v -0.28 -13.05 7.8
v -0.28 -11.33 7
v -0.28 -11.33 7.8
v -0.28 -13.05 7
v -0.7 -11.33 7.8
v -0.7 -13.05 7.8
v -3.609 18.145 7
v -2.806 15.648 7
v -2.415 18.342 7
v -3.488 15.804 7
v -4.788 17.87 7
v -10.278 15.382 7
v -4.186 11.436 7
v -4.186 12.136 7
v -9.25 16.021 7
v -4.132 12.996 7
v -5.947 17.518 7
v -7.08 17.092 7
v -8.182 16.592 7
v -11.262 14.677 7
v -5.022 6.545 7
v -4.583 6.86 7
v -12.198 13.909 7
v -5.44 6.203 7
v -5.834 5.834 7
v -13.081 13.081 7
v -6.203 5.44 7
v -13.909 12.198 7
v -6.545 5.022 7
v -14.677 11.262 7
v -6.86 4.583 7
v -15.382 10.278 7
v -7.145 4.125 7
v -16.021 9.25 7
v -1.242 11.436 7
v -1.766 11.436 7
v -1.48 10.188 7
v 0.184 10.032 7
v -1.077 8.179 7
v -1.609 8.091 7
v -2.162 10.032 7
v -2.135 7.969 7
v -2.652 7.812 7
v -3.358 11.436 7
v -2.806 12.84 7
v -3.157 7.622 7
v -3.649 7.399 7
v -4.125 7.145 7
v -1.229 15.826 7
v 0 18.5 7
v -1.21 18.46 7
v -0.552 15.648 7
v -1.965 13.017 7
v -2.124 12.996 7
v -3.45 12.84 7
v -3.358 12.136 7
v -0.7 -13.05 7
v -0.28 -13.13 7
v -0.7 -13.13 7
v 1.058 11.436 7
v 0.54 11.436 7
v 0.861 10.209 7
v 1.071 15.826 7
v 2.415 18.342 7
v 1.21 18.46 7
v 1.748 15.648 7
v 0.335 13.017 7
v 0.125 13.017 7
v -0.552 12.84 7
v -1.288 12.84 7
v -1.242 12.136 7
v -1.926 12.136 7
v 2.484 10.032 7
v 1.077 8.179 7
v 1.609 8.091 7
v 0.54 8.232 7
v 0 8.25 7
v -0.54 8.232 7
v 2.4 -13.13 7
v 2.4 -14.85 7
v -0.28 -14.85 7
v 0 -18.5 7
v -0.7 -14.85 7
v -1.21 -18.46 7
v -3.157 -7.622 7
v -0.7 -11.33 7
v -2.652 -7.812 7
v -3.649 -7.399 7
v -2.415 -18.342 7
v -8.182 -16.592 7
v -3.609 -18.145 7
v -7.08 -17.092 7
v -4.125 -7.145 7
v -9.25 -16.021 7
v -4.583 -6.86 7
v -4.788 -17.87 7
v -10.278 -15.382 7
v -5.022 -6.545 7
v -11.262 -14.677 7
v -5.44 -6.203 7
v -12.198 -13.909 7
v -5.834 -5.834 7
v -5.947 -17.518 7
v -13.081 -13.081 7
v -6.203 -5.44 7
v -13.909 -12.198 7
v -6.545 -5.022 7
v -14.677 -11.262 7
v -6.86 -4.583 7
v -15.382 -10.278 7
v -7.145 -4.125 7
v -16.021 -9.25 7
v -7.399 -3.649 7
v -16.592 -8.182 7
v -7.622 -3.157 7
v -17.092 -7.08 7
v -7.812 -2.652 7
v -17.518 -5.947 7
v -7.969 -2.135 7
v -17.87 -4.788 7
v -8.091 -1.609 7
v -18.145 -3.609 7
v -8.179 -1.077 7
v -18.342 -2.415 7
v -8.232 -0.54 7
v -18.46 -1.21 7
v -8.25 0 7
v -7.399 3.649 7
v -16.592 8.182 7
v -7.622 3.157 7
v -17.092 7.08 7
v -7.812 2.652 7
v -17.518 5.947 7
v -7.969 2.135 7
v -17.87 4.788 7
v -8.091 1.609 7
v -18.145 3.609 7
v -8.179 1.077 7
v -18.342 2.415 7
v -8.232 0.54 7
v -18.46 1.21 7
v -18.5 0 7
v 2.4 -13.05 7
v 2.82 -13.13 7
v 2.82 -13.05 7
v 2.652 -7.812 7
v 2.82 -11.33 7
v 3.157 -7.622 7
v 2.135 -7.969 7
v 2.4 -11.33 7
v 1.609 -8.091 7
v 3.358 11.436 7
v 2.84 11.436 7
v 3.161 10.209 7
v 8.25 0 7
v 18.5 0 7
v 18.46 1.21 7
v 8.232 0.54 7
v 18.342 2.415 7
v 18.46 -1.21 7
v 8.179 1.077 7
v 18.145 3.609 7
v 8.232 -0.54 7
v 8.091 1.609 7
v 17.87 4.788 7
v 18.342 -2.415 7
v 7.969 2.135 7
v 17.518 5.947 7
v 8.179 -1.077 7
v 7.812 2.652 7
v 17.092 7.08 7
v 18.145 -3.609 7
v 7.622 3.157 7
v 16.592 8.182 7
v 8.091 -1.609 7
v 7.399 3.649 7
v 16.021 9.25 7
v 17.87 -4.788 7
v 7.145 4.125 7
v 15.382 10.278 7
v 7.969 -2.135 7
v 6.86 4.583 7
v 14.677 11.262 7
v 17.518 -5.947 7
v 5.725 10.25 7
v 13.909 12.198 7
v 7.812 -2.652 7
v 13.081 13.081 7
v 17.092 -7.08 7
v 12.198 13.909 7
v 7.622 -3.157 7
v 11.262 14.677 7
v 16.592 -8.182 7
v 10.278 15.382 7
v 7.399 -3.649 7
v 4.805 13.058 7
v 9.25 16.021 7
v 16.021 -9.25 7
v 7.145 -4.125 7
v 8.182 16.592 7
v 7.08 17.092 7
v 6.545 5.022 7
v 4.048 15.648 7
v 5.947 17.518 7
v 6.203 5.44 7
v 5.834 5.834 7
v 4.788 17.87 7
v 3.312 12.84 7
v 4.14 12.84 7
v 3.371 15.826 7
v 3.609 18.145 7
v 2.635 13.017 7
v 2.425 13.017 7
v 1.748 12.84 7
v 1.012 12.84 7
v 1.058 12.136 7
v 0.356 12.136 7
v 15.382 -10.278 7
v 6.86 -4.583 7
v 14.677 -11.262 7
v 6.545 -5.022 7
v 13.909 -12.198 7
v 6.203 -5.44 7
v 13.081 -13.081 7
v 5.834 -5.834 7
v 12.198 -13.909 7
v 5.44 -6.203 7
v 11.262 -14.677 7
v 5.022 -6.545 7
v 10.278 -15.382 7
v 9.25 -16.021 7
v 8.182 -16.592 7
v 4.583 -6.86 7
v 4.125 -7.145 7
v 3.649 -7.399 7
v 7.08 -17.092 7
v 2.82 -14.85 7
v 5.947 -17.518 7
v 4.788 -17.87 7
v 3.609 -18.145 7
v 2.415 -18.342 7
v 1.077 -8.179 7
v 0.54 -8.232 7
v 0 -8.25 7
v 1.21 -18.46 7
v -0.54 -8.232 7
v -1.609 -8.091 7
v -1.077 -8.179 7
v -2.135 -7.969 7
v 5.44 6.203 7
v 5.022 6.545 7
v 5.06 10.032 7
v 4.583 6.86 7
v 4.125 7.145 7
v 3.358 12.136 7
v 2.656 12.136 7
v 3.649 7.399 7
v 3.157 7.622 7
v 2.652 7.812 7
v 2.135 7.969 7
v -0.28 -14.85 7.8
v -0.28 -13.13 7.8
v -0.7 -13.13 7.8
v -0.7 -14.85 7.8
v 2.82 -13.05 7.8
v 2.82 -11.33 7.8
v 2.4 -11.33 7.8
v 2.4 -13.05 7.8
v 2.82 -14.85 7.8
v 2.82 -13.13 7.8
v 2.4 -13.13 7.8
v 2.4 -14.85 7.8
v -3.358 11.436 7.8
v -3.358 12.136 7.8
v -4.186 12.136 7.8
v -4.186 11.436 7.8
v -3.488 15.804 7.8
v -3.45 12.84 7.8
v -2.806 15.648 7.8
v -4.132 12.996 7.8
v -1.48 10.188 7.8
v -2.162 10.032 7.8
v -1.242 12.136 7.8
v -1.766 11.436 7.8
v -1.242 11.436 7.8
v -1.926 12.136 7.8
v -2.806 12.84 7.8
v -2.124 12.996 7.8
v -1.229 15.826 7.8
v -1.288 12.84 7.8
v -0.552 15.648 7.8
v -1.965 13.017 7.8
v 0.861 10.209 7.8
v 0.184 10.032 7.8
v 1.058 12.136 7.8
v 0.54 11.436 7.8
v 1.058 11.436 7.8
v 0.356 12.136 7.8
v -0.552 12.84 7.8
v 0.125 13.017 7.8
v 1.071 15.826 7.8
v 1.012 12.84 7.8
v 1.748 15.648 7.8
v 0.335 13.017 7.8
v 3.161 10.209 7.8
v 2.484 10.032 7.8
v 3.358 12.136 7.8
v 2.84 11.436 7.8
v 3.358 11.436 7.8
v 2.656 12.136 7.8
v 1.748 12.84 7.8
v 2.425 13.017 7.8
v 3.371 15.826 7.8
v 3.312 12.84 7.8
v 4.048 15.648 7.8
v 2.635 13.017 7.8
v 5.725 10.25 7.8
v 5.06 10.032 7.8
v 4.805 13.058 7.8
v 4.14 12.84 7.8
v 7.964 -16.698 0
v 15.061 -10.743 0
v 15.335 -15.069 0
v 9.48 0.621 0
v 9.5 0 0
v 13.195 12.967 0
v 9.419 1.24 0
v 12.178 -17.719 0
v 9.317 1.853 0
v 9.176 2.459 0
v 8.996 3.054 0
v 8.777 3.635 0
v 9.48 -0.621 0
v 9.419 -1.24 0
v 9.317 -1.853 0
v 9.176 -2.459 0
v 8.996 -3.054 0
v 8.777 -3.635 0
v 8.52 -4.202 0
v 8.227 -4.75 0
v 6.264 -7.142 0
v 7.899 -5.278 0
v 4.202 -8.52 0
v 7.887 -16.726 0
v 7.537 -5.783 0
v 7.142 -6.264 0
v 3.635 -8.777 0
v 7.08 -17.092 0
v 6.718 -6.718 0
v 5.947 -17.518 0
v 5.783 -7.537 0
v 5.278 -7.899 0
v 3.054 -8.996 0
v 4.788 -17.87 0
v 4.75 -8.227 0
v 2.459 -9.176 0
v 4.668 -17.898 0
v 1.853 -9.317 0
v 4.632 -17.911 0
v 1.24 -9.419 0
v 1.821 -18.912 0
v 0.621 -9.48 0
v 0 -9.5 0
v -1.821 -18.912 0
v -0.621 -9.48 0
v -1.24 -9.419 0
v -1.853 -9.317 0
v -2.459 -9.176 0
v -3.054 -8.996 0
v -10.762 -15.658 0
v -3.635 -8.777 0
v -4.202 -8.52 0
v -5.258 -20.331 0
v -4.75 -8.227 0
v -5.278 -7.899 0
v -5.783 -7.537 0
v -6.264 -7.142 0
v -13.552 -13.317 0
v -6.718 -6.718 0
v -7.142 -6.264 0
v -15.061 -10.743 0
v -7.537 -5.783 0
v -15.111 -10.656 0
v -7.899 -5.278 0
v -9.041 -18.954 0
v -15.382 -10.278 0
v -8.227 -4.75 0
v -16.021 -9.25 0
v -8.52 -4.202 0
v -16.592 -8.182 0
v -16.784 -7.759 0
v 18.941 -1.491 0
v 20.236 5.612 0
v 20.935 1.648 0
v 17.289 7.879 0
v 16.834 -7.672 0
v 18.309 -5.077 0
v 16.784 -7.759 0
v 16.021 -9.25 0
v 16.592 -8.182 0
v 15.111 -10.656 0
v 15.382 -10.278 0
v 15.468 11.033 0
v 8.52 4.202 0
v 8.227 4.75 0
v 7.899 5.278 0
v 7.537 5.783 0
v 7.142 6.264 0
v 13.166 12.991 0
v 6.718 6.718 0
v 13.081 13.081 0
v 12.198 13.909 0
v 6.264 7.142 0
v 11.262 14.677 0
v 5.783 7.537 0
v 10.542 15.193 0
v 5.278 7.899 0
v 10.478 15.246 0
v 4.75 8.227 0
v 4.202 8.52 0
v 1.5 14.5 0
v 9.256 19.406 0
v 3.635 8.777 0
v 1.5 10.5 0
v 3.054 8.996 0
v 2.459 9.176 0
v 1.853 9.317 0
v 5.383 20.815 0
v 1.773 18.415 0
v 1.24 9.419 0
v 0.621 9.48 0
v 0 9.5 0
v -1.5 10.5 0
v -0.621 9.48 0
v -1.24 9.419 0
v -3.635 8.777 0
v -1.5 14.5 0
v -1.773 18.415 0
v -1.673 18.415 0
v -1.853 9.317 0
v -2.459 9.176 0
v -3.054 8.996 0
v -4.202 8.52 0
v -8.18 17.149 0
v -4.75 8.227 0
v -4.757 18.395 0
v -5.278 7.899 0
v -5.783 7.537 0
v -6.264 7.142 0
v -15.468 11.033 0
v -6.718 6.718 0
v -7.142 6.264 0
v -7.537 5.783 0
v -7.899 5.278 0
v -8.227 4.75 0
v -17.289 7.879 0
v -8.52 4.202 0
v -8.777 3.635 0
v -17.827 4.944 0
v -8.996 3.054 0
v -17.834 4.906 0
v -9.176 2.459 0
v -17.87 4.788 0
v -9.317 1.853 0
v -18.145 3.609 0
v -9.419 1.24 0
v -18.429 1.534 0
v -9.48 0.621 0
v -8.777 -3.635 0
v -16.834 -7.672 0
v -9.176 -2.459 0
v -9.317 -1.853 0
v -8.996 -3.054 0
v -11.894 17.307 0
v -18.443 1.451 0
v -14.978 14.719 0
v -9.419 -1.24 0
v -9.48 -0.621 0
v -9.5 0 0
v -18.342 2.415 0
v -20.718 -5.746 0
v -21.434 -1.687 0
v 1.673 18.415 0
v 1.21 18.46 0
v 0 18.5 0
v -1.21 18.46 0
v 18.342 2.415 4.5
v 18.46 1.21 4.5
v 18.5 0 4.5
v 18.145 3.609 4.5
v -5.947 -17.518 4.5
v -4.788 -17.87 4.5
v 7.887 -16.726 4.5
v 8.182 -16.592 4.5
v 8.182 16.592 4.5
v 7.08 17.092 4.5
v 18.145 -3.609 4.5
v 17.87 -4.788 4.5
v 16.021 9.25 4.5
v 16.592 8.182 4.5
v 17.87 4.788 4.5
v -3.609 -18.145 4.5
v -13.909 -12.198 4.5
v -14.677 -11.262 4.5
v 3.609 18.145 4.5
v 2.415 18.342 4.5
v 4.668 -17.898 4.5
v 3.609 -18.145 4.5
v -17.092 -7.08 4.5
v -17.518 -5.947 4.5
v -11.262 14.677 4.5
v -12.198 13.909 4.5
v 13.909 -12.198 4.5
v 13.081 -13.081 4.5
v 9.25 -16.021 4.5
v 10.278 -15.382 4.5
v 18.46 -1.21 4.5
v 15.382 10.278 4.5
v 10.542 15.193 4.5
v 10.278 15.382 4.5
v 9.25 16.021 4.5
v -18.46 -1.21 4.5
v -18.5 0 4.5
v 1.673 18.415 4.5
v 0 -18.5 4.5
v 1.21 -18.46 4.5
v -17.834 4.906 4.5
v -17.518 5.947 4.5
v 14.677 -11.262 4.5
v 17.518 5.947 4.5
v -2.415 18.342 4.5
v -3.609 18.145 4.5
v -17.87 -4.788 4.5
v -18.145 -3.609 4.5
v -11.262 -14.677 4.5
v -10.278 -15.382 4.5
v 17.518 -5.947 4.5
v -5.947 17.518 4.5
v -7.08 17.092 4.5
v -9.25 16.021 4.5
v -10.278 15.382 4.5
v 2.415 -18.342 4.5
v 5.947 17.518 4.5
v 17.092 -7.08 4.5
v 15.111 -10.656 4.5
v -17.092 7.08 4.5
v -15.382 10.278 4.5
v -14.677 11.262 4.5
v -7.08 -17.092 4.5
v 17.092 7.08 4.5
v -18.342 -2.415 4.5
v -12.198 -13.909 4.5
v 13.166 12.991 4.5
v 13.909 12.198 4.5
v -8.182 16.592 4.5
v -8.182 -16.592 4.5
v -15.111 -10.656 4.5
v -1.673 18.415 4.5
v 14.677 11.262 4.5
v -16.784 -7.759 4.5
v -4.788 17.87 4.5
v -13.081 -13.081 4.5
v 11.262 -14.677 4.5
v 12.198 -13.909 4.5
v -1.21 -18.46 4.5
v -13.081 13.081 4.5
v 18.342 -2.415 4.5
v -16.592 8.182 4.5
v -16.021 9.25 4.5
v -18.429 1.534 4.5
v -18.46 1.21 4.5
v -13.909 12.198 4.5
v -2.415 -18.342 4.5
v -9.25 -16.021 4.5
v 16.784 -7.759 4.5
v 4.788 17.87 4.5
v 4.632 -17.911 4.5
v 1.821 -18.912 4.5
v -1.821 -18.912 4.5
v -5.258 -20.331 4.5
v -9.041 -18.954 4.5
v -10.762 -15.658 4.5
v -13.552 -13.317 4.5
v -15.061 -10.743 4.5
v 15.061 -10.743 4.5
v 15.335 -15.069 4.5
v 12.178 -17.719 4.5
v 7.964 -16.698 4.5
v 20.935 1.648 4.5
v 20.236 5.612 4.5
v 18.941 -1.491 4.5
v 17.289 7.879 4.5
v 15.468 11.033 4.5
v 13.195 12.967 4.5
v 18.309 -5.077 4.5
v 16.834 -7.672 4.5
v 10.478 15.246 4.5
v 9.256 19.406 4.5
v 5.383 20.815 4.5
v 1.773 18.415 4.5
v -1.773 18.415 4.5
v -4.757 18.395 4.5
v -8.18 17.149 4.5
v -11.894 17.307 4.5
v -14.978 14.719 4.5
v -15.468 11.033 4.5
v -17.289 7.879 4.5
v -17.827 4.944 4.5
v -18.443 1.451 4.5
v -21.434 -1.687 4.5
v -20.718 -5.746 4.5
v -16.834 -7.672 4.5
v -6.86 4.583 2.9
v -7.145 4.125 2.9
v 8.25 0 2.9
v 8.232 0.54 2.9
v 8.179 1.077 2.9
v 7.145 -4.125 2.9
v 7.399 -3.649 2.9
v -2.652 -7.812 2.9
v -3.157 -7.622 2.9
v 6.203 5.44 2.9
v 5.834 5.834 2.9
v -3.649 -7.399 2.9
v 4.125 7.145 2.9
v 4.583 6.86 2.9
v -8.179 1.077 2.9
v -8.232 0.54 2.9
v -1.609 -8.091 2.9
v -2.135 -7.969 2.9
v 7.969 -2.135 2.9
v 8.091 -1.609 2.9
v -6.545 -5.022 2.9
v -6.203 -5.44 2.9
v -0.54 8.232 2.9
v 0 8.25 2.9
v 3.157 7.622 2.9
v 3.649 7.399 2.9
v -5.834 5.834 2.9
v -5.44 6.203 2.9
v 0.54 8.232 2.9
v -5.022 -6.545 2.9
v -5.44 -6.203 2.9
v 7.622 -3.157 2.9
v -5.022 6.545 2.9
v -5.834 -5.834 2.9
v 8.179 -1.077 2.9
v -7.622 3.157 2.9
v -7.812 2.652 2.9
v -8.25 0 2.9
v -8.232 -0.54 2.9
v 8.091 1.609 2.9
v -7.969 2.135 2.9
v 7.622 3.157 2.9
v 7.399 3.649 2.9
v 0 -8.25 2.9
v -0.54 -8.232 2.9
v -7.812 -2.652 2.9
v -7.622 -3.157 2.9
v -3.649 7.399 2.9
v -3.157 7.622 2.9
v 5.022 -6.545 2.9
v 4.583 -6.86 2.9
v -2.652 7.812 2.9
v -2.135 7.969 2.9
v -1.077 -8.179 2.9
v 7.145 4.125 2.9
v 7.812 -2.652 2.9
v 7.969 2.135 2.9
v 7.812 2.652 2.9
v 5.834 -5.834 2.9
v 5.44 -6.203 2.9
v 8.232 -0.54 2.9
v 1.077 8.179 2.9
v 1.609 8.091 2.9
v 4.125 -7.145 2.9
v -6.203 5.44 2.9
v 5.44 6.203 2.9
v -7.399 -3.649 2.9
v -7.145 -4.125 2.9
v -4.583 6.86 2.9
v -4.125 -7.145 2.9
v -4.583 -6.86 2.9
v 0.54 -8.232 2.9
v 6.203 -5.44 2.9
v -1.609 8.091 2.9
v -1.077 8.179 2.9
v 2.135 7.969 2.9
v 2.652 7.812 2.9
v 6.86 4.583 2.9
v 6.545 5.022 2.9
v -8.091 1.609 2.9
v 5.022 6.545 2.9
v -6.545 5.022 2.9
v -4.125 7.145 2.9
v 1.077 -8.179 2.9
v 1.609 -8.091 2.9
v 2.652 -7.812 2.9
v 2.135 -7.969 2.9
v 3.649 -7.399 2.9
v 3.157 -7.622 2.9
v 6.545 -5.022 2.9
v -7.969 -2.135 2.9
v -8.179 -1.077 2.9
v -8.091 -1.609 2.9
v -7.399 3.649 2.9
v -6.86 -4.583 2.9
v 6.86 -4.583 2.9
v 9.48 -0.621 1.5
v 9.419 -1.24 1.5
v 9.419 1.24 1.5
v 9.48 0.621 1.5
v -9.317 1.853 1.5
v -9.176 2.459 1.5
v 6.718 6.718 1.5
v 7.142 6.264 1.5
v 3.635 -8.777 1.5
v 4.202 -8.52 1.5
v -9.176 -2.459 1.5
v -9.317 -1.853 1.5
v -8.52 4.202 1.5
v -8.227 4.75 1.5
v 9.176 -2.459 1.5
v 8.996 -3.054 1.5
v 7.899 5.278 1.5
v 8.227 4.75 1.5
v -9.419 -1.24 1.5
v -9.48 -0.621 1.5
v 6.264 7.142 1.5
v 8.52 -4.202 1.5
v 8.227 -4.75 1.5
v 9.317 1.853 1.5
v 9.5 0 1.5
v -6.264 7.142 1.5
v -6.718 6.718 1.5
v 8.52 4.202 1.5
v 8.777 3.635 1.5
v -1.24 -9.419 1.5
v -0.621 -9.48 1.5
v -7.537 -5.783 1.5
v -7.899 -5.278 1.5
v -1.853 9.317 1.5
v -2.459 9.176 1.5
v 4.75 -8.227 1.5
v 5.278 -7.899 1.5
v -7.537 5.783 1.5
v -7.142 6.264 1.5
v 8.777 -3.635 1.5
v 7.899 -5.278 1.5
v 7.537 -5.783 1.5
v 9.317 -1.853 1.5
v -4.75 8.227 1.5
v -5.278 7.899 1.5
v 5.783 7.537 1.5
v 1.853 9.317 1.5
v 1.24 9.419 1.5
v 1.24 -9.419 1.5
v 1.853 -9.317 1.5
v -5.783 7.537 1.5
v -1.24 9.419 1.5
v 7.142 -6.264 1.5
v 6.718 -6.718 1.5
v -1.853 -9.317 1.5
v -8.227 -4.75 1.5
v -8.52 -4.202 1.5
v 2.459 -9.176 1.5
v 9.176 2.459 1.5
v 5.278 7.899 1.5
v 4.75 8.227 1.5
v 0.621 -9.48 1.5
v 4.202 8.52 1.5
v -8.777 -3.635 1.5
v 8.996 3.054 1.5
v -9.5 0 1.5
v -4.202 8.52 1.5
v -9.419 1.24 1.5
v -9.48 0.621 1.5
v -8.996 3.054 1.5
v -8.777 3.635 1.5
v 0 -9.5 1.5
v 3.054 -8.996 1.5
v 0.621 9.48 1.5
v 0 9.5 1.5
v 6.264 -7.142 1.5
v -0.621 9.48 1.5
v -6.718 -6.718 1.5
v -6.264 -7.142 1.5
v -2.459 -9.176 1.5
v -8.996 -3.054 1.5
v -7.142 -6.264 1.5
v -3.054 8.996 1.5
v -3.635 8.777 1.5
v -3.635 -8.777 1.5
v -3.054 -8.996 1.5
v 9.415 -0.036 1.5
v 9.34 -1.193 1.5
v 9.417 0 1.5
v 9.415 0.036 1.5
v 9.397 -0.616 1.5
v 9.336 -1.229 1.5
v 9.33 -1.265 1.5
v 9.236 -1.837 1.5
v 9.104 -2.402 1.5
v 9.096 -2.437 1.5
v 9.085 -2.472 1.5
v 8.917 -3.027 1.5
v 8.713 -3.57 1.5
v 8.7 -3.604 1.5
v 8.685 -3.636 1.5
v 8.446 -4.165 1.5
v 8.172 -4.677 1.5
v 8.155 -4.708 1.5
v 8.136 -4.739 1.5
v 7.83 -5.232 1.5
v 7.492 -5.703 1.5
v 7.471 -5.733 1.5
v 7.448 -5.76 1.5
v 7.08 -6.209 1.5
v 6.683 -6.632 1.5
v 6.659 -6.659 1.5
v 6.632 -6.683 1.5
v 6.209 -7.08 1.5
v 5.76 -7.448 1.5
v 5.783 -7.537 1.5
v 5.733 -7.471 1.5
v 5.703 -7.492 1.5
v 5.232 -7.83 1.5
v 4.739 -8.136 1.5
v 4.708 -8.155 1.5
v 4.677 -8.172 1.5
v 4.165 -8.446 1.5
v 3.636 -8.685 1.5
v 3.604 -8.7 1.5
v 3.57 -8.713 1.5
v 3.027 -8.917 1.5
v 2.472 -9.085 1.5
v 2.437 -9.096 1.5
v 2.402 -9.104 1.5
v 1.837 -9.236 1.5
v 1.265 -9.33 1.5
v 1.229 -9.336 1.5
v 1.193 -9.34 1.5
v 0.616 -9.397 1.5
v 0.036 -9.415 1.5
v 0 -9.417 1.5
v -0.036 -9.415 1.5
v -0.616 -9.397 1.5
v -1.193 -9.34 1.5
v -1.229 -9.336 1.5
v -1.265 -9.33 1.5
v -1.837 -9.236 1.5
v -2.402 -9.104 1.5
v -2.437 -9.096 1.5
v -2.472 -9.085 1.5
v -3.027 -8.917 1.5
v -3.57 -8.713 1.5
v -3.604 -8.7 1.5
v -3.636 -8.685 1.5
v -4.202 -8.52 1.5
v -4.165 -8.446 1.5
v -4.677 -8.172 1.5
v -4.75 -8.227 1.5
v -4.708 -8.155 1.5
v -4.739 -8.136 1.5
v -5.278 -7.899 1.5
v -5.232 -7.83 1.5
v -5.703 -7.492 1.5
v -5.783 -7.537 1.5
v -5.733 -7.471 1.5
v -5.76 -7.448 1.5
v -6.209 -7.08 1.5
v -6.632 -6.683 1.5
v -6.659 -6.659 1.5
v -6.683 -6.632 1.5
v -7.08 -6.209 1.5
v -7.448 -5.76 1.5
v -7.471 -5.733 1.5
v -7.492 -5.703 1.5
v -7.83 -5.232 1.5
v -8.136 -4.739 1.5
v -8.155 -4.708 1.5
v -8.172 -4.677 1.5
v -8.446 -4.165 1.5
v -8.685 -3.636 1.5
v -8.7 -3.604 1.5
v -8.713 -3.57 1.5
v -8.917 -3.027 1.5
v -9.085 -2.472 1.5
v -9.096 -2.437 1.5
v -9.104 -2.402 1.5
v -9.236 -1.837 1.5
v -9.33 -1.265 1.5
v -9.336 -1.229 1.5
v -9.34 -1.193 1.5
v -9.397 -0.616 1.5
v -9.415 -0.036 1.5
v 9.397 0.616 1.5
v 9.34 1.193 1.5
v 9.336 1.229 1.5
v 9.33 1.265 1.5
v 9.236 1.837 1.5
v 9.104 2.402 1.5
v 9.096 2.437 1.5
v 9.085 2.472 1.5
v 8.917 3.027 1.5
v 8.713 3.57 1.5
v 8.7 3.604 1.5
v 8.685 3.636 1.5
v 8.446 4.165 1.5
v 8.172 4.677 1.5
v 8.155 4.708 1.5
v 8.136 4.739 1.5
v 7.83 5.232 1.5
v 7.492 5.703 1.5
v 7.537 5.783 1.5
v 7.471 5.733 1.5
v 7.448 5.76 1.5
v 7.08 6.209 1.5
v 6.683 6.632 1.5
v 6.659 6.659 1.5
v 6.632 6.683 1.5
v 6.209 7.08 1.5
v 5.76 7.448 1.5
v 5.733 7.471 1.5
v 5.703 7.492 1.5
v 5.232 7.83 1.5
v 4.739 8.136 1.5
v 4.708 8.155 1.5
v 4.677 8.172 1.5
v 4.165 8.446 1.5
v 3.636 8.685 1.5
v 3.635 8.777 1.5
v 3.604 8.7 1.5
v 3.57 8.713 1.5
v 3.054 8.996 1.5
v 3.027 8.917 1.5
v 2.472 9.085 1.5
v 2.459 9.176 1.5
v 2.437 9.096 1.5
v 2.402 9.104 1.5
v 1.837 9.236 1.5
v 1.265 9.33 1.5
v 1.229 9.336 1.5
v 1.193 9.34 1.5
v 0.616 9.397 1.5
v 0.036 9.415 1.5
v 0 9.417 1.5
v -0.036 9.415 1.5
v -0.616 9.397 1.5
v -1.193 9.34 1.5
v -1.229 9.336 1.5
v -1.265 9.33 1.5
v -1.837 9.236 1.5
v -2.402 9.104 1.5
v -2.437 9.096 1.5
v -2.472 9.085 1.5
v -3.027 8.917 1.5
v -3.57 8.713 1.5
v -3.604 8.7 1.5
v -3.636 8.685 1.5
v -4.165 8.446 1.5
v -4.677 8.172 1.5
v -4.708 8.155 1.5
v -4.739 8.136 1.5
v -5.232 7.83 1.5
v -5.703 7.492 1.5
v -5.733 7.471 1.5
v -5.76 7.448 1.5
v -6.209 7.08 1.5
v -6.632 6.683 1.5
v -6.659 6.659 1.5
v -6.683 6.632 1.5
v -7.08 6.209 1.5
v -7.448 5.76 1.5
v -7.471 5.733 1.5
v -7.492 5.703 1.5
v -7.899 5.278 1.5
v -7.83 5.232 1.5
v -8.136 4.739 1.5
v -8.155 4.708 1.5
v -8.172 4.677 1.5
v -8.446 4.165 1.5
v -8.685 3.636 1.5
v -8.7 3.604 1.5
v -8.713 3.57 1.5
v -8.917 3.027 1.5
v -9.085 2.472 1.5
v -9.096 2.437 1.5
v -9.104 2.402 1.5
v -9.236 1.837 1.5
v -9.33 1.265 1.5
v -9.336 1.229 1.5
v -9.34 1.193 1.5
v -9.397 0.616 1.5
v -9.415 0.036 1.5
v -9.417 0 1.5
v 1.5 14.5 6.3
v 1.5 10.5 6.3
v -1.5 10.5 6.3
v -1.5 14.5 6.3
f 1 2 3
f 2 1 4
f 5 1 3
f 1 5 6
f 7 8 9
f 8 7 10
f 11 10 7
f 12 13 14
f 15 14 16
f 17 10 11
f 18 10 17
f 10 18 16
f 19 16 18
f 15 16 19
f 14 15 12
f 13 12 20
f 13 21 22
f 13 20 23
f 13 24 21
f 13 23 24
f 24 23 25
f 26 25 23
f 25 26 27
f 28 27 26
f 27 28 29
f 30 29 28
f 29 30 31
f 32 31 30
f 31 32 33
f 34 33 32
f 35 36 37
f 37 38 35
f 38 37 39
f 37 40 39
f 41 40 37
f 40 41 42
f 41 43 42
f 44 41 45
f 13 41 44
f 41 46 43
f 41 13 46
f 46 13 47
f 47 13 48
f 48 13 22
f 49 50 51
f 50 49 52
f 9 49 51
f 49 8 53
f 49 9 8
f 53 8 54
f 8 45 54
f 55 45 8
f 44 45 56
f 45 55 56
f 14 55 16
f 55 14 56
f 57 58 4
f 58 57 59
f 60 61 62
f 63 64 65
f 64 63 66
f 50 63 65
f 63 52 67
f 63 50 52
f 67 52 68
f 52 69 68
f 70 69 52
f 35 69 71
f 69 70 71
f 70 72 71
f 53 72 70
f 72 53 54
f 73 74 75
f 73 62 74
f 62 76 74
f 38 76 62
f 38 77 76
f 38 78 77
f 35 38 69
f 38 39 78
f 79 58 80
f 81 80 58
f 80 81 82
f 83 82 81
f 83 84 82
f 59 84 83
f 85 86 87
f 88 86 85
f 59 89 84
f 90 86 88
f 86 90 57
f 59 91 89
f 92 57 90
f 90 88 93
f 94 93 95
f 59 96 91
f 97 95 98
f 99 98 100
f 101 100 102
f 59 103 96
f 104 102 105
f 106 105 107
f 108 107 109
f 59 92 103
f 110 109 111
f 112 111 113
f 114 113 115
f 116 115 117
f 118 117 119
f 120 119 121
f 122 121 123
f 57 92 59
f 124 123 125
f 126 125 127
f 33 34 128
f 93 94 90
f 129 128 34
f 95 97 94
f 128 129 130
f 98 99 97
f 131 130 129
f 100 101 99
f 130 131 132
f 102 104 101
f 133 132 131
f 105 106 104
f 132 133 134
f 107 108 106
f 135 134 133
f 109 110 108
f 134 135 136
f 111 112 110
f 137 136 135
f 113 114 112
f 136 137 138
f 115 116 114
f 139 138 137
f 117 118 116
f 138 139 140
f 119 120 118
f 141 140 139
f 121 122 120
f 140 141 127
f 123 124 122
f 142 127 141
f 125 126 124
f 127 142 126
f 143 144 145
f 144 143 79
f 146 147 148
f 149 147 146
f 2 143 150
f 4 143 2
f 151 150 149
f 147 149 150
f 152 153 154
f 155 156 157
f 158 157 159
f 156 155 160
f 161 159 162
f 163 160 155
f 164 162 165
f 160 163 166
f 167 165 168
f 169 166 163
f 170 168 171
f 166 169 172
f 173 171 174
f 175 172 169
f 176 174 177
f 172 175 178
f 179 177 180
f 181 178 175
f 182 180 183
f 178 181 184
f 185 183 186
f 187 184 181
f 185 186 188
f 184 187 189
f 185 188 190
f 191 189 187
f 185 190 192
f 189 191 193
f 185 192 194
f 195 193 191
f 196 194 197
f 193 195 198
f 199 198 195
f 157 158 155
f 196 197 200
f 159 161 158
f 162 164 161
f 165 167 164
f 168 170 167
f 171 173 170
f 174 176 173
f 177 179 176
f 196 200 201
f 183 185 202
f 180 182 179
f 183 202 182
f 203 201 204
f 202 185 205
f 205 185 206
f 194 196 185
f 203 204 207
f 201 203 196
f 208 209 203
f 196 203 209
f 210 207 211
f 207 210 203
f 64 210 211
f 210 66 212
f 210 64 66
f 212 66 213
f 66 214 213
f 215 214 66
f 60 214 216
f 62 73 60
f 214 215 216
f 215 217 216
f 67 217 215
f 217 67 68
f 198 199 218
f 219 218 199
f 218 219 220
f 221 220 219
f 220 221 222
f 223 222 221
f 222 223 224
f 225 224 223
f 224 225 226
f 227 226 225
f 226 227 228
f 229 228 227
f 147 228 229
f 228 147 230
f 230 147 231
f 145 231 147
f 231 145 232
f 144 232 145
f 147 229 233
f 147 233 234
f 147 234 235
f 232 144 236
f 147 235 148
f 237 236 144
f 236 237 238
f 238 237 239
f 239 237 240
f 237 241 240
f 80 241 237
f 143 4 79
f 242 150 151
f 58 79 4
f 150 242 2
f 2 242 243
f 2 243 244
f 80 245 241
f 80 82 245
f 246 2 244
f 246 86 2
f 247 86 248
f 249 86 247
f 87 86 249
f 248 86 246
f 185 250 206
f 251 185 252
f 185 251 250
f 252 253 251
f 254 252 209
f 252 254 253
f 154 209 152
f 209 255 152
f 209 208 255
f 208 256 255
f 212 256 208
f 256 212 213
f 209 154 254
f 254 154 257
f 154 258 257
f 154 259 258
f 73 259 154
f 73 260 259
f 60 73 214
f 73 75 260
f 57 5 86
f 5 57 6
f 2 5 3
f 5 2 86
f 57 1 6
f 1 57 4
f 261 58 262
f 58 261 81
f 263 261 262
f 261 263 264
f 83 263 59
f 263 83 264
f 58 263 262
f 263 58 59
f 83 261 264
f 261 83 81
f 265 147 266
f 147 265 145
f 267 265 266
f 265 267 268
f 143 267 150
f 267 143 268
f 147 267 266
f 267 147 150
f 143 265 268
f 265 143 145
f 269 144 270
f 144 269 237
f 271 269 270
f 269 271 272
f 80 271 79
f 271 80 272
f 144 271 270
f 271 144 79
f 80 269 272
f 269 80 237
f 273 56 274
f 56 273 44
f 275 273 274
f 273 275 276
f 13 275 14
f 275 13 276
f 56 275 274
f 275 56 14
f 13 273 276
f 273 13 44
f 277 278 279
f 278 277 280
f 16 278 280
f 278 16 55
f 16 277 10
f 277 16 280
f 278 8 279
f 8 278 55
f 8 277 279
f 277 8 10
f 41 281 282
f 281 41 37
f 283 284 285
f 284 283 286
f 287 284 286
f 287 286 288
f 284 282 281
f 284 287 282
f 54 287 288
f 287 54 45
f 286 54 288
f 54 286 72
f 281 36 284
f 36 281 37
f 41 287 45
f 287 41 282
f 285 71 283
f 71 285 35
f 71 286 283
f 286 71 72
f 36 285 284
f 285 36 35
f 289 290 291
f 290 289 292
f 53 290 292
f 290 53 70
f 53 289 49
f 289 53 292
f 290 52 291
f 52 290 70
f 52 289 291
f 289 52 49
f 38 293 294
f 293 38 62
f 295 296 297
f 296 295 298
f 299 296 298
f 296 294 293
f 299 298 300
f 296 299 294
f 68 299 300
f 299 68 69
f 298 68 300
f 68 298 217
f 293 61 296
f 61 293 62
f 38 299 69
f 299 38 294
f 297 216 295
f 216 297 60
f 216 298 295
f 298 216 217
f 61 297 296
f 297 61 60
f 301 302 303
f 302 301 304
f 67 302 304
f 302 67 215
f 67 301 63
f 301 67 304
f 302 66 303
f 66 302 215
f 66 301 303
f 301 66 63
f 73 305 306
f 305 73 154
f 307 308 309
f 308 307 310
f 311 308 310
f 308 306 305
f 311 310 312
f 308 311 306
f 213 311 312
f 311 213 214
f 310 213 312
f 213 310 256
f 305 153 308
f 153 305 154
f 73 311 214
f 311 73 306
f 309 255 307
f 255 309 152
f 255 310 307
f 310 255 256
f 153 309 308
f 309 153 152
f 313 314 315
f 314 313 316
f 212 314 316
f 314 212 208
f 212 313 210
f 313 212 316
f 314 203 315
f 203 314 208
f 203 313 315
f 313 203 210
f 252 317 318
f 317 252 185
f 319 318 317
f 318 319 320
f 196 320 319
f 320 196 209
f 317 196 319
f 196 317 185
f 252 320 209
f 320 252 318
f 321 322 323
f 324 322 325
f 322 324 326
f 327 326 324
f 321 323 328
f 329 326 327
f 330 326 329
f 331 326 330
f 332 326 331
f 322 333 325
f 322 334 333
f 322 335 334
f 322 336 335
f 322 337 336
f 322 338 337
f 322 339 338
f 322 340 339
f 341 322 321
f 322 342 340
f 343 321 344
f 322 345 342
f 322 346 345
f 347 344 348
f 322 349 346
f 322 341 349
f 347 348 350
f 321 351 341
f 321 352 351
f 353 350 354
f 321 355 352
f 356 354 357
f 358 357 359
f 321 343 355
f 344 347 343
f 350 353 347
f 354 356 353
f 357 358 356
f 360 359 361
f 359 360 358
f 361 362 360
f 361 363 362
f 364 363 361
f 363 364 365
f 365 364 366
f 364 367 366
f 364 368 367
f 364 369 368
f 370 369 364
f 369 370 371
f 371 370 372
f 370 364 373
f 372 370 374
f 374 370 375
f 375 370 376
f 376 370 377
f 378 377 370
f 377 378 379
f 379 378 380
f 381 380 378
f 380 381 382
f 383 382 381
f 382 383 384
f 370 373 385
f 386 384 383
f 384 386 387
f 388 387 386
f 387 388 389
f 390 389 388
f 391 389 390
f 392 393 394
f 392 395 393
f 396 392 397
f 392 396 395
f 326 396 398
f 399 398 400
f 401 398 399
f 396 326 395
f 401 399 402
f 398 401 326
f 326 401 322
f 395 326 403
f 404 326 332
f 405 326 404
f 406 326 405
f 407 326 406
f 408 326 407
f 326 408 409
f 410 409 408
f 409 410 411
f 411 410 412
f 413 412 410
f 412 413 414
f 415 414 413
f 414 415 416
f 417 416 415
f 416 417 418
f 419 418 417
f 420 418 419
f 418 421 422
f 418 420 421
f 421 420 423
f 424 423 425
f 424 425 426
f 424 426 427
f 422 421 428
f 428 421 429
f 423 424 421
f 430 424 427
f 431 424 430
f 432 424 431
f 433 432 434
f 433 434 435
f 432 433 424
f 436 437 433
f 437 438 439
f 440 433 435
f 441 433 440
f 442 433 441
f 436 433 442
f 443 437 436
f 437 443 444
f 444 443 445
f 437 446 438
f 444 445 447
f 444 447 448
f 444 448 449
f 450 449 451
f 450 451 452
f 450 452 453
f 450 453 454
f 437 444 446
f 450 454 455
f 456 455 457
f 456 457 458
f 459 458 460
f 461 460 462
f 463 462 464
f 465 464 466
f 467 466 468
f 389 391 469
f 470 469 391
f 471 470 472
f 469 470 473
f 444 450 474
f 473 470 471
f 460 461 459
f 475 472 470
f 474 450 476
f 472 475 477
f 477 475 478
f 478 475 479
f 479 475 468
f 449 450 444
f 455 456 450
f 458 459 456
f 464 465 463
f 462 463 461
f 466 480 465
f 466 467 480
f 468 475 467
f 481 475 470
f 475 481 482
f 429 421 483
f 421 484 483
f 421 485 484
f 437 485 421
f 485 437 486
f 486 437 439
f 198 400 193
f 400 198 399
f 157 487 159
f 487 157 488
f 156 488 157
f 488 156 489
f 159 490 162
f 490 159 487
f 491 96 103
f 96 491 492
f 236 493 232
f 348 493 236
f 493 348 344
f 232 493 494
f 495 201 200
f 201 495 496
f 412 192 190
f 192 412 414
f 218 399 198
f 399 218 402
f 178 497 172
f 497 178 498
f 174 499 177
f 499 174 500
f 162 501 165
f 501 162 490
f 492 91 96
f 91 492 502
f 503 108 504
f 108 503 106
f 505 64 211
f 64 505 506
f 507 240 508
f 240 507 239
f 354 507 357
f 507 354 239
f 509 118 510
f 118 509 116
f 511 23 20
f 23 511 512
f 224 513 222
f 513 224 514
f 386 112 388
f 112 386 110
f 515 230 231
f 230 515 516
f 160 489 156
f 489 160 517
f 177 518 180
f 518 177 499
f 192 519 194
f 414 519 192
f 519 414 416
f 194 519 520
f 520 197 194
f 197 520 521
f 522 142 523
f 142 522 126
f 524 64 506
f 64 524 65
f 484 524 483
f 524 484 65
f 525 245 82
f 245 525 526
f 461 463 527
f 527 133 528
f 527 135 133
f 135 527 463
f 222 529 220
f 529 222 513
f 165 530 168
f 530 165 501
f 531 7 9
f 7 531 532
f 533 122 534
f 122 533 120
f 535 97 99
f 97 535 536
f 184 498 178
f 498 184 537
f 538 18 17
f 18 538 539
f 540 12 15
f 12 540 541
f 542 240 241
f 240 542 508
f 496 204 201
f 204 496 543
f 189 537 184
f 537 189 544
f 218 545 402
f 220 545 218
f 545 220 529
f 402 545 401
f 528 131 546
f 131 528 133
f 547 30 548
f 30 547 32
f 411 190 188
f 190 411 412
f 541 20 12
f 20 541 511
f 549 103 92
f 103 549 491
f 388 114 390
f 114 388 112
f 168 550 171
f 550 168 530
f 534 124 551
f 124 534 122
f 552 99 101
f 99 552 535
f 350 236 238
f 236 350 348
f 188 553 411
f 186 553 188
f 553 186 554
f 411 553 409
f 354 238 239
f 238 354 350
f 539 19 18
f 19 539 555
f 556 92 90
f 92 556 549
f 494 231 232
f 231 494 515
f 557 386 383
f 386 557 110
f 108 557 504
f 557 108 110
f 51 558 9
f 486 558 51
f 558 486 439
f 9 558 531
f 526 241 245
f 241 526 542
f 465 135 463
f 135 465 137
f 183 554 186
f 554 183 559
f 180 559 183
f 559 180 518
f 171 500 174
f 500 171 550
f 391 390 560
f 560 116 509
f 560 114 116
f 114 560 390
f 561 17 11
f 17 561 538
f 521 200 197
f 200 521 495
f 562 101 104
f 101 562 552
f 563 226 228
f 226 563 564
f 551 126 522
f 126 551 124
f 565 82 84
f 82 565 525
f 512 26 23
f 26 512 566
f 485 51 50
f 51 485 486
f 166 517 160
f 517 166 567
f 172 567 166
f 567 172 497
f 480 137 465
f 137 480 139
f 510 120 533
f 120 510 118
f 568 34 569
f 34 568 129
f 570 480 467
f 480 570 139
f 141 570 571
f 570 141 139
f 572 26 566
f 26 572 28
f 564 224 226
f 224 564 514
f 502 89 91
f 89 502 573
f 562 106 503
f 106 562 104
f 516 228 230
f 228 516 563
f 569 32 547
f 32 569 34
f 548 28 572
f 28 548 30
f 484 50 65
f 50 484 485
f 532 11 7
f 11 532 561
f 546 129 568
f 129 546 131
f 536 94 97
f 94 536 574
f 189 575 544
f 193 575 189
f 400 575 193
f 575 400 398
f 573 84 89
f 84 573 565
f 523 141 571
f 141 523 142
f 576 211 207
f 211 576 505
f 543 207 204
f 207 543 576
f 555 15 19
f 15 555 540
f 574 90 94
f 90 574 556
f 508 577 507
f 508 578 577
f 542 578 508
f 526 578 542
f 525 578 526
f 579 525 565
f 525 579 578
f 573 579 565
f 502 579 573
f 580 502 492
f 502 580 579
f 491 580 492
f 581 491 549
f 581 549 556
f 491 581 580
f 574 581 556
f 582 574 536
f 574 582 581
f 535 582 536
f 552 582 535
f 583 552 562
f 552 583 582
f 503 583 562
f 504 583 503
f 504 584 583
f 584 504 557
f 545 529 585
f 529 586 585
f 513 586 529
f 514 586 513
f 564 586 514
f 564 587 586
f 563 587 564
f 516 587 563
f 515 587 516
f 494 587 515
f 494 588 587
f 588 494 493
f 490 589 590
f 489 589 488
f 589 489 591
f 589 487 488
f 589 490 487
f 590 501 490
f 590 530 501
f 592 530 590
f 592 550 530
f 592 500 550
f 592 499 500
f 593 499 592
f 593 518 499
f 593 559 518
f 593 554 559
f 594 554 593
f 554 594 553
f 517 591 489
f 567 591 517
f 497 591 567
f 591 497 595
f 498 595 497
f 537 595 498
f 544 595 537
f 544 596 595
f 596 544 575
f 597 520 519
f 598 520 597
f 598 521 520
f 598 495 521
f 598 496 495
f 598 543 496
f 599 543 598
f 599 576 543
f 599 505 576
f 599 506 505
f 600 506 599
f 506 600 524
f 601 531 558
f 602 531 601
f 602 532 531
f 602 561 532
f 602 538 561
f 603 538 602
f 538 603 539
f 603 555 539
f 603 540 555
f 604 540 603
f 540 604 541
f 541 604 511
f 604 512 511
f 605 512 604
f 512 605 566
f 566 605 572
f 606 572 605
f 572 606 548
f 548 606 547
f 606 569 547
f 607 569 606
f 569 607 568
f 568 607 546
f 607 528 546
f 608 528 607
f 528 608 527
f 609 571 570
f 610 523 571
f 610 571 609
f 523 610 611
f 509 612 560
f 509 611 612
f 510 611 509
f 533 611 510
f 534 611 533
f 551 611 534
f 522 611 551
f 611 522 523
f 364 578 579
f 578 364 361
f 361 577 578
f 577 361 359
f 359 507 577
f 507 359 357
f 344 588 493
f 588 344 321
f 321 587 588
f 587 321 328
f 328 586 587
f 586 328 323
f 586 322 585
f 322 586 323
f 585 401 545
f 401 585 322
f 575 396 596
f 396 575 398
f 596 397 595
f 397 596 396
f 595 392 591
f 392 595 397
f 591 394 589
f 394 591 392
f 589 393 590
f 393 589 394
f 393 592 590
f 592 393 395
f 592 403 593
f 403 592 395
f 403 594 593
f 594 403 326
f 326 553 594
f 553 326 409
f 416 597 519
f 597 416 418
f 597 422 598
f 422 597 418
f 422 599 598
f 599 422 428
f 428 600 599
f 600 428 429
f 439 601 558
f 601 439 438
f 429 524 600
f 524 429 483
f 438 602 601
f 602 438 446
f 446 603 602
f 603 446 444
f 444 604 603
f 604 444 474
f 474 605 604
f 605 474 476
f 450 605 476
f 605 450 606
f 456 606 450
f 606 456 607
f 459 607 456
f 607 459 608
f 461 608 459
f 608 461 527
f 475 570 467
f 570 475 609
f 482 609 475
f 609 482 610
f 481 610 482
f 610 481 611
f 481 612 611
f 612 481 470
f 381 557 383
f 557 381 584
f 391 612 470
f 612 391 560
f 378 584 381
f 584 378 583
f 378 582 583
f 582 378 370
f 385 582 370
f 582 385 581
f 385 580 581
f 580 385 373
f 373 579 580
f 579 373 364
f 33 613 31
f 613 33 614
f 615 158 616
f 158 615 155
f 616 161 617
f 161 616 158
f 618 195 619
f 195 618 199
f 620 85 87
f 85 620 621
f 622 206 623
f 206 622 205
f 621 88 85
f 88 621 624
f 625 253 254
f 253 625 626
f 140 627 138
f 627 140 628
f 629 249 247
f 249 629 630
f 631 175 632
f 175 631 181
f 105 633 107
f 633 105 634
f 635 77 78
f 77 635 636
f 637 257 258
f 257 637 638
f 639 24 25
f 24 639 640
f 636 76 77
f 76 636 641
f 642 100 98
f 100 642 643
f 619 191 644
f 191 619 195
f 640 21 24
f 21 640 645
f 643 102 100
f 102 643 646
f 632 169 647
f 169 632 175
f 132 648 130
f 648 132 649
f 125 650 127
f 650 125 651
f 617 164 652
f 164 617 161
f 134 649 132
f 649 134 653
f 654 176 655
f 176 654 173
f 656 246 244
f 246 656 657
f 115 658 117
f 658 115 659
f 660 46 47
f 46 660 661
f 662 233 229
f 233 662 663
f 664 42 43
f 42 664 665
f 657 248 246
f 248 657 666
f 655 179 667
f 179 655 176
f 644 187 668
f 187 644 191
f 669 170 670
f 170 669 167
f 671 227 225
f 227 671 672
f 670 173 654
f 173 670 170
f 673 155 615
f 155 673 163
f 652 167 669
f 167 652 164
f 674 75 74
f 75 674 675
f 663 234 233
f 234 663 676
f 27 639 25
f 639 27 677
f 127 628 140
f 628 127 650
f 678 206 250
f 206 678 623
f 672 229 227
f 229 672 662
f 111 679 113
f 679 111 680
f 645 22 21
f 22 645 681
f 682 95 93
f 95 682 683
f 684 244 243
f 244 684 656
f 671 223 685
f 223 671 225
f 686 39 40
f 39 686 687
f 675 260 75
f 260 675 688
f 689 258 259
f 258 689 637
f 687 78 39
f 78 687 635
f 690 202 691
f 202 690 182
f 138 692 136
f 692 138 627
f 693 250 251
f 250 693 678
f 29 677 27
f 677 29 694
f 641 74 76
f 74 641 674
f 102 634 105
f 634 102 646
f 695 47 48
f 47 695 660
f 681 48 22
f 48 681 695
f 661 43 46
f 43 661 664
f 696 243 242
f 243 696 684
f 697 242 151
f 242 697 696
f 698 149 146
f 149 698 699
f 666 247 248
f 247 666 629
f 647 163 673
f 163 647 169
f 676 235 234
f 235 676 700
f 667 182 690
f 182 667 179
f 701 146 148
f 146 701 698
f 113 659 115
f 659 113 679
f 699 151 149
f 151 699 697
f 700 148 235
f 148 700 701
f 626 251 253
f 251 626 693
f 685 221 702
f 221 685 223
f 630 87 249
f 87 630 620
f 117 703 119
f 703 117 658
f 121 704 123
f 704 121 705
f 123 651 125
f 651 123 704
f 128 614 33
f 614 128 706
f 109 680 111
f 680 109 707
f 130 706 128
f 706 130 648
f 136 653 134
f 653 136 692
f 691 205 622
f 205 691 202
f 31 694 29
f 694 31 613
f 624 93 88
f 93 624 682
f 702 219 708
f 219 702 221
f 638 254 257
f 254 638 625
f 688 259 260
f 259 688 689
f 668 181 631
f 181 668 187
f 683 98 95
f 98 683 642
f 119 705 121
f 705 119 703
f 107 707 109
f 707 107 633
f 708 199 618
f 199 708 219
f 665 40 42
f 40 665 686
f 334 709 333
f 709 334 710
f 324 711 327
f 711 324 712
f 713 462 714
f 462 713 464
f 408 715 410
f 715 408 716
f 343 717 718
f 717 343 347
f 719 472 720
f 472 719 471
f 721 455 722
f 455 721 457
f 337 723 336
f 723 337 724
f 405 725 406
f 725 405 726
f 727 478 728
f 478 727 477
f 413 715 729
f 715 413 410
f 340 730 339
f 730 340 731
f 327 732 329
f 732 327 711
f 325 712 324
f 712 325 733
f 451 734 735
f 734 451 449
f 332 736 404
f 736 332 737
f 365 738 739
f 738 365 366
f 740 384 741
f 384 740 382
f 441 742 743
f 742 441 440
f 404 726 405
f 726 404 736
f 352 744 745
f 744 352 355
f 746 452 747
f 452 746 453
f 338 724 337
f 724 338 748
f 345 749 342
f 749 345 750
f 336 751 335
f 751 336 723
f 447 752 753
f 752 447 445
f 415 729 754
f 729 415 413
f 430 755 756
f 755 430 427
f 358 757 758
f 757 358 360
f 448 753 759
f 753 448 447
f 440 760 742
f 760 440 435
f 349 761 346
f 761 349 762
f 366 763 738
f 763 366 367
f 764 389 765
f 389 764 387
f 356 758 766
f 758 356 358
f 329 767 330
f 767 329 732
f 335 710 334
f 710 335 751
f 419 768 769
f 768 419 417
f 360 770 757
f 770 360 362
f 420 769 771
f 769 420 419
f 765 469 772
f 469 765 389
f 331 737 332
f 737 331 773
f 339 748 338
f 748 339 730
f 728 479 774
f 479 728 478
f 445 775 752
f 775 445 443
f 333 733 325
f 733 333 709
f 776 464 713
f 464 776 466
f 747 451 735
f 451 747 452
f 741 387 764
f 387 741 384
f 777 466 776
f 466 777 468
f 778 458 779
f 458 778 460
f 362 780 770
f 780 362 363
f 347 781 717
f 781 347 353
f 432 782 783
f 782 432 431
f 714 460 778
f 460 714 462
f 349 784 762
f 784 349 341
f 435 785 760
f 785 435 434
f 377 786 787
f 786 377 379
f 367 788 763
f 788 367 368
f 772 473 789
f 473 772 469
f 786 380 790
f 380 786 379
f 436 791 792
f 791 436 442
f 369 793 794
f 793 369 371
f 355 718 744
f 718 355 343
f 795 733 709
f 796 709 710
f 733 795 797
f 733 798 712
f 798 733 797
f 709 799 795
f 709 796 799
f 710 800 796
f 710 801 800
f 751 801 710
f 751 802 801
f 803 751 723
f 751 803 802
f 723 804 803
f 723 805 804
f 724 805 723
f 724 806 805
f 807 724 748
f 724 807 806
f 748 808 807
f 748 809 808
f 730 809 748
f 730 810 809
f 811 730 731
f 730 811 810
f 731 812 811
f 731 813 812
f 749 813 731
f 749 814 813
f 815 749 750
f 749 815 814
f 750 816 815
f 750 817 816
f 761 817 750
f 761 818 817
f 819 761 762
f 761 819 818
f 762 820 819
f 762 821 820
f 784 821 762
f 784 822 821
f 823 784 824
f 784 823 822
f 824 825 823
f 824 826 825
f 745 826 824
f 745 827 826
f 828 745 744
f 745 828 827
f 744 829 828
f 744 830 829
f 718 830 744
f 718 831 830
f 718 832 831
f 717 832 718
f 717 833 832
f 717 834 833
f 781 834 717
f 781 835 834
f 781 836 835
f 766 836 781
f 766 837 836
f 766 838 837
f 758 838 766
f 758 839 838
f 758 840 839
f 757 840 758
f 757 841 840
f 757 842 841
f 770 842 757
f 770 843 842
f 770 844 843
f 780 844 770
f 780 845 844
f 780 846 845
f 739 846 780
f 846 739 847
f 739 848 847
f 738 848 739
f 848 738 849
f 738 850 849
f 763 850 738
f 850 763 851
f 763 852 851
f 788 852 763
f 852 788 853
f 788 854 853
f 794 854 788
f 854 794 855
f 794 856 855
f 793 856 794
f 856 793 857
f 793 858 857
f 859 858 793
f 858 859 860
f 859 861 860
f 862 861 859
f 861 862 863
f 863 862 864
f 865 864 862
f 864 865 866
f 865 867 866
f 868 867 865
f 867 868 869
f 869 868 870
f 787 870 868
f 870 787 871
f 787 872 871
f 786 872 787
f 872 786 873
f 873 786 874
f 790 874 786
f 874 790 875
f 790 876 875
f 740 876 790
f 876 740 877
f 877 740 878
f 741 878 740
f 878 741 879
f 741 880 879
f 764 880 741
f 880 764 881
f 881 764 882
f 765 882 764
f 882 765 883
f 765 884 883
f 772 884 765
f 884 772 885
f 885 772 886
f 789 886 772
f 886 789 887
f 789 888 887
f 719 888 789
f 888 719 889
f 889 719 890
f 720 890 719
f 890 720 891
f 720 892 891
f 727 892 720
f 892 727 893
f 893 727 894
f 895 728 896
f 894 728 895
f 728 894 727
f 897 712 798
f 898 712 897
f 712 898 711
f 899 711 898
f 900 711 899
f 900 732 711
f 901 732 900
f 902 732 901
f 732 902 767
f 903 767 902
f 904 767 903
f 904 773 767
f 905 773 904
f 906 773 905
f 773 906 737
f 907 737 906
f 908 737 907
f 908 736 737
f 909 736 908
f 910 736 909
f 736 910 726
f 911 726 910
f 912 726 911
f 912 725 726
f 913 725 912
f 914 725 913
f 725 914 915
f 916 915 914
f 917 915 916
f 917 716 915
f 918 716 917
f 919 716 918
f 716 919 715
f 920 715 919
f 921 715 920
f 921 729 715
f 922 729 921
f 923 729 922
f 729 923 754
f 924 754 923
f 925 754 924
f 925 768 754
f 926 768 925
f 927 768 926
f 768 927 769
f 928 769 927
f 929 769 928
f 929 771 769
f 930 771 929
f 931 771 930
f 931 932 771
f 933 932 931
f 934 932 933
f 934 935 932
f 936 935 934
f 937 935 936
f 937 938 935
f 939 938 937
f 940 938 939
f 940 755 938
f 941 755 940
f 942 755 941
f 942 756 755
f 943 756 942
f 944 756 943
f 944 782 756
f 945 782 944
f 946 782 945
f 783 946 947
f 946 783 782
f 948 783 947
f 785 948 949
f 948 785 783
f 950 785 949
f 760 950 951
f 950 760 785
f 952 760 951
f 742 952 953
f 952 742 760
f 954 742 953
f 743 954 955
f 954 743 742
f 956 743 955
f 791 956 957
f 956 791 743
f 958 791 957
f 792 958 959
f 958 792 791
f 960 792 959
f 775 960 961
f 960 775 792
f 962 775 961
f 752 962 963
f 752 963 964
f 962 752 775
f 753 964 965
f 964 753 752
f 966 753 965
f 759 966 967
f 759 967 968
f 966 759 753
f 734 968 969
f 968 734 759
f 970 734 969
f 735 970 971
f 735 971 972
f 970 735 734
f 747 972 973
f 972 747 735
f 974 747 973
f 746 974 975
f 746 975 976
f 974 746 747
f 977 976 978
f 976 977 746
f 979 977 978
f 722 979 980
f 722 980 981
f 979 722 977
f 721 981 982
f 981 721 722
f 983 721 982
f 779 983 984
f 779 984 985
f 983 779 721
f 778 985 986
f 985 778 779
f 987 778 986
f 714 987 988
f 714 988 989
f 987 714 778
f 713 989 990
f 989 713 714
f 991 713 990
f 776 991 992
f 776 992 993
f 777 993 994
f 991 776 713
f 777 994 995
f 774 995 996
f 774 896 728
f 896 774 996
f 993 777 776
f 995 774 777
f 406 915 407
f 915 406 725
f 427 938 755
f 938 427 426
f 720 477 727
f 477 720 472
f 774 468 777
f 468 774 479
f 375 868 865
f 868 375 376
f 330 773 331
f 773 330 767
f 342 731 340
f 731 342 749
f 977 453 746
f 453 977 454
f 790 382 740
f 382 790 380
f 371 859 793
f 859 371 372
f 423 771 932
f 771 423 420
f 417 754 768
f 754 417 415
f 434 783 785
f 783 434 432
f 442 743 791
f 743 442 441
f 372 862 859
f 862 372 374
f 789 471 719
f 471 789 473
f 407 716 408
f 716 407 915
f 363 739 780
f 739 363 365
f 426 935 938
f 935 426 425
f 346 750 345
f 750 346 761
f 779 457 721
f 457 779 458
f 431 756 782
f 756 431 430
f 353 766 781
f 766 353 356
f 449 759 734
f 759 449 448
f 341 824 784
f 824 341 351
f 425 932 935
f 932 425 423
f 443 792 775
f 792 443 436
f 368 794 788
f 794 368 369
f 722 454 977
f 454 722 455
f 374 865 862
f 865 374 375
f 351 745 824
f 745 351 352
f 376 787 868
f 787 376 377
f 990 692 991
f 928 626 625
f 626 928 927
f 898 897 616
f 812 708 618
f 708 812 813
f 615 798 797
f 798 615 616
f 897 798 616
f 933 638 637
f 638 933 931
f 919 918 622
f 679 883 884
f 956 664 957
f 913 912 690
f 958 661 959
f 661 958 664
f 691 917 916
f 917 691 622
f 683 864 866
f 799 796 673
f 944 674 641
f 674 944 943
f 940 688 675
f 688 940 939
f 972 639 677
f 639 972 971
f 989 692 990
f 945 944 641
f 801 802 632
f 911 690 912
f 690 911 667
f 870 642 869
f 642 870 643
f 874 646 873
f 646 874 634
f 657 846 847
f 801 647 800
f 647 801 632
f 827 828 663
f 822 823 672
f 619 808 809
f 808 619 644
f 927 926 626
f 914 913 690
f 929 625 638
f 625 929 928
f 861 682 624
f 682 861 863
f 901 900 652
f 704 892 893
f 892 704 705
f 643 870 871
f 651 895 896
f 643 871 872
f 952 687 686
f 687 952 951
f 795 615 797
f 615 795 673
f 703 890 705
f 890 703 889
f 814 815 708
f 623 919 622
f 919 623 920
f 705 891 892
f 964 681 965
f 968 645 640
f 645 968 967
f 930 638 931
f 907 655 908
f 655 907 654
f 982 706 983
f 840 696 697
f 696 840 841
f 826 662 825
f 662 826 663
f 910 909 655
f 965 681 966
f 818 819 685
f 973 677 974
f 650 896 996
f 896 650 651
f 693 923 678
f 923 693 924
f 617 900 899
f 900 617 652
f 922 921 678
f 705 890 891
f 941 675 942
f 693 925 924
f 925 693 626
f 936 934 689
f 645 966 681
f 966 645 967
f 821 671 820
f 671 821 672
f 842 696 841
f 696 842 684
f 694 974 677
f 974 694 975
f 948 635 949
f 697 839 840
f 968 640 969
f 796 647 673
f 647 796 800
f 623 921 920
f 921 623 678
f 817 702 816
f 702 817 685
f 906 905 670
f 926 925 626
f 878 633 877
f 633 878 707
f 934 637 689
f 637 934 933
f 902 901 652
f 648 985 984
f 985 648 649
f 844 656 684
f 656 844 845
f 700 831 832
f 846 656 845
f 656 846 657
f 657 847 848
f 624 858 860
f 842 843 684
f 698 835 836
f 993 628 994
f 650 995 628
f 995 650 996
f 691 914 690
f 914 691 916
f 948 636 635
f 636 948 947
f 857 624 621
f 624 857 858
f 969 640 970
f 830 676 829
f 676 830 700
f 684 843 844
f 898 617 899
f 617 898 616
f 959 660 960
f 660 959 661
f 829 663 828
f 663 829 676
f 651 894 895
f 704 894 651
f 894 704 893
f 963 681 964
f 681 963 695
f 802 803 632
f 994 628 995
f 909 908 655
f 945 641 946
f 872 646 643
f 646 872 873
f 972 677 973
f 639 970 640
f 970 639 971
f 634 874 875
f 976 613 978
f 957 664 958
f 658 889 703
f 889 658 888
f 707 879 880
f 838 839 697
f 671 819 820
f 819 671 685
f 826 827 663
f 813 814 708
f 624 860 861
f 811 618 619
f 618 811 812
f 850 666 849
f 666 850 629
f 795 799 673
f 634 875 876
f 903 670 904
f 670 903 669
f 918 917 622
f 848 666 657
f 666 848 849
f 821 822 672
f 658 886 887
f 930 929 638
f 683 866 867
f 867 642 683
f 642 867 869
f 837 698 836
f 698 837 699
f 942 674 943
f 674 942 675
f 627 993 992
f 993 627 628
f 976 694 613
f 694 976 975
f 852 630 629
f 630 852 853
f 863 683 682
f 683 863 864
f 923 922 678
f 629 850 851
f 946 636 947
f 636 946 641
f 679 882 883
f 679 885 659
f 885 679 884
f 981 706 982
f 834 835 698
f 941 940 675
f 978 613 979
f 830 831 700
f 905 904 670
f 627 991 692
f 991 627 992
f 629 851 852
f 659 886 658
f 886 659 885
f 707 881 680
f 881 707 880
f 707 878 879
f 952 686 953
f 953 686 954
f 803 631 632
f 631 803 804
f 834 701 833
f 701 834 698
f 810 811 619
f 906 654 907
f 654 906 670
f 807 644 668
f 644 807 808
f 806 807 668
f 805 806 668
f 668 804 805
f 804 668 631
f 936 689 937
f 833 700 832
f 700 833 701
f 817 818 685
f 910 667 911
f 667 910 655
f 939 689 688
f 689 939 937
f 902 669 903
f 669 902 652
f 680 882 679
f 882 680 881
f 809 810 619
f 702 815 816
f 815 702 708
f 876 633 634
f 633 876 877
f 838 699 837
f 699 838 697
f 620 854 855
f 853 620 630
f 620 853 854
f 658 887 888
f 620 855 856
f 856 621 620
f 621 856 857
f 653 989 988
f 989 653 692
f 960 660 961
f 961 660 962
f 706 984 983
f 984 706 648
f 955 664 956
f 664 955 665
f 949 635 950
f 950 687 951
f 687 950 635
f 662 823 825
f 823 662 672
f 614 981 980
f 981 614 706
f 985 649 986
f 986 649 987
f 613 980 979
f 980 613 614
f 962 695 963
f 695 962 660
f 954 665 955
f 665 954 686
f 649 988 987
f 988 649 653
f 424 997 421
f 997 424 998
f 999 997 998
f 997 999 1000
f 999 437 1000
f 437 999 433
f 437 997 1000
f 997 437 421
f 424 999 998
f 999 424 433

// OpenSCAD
/*
  Elna Supermatic single cam 11
  Name: Arrowheads
  Status: candidate
  Visible raised number and stitch preview.

  IMPORTANT:
  Labels are raised geometry, not engraved text. They should be visible in render and print.
  Cam profile is still a candidate and must be verified against real photos/STL.

  License: GPL-3.0-or-later.
*/

$fn = 96;

disc_thickness = 7;
body_radius = 17;
outer_reference_radius = 18.5;
lobe_thickness = 4.5;
label_height = 0.80;

inner_hole_rad = 8.25;
hole_bigger_rad = 9.5;
bigger_hole_ht = 1.5;
hole_cone_ht = 1.5;
cut_errors = 0.1;

gap_to_transporthole = 1;
transporthole_width = 3;
transporthole_depth = 5.5;
transporthole_length = 4;

module lobe_profile() {
    polygon(points=[
        [-1.7731, 18.4148],
        [1.7731, 18.4148],
        [5.3832, 20.8152],
        [9.2560, 19.4056],
        [10.4785, 15.2463],
        [13.1951, 12.9668],
        [15.4682, 11.0334],
        [17.2893, 7.8792],
        [20.2362, 5.6120],
        [20.9353, 1.6476],
        [18.9414, -1.4907],
        [18.3090, -5.0775],
        [16.8343, -7.6718],
        [15.0611, -10.7430],
        [15.3349, -15.0695],
        [12.1777, -17.7187],
        [7.9645, -16.6978],
        [4.6320, -17.9107],
        [1.8211, -18.9125],
        [-1.8211, -18.9125],
        [-5.2580, -20.3311],
        [-9.0407, -18.9543],
        [-10.7617, -15.6584],
        [-13.5518, -13.3173],
        [-15.0611, -10.7430],
        [-16.8343, -7.6718],
        [-20.7181, -5.7456],
        [-21.4337, -1.6869],
        [-18.4430, 1.4515],
        [-17.8272, 4.9439],
        [-17.2893, 7.8792],
        [-15.4682, 11.0334],
        [-14.9783, 14.7191],
        [-11.8945, 17.3066],
        [-8.1797, 17.1491],
        [-4.7572, 18.3948]
    ]);
}

module digit_segments(d) {
    // 7-segment digit, raised from cubes. Local digit approx 2.4 x 4.0 mm.
    seg_w = 2.2;
    seg_t = 0.42;
    seg_v = 1.72;

    module hseg(y) {
        translate([-seg_w/2, y, disc_thickness])
            cube([seg_w, seg_t, label_height]);
    }
    module vseg(x, y) {
        translate([x, y, disc_thickness])
            cube([seg_t, seg_v, label_height]);
    }

    // segment map: a top, b upper-right, c lower-right, d bottom, e lower-left, f upper-left, g middle
    if (d == 0) { hseg(1.8); vseg(0.85,0.15); vseg(0.85,-1.65); hseg(-1.8); vseg(-1.25,-1.65); vseg(-1.25,0.15); }
    if (d == 1) { vseg(0.85,0.15); vseg(0.85,-1.65); }
    if (d == 2) { hseg(1.8); vseg(0.85,0.15); hseg(0); vseg(-1.25,-1.65); hseg(-1.8); }
    if (d == 3) { hseg(1.8); vseg(0.85,0.15); hseg(0); vseg(0.85,-1.65); hseg(-1.8); }
    if (d == 4) { vseg(-1.25,0.15); hseg(0); vseg(0.85,0.15); vseg(0.85,-1.65); }
    if (d == 5) { hseg(1.8); vseg(-1.25,0.15); hseg(0); vseg(0.85,-1.65); hseg(-1.8); }
    if (d == 6) { hseg(1.8); vseg(-1.25,0.15); hseg(0); vseg(0.85,-1.65); vseg(-1.25,-1.65); hseg(-1.8); }
    if (d == 7) { hseg(1.8); vseg(0.85,0.15); vseg(0.85,-1.65); }
    if (d == 8) { hseg(1.8); vseg(0.85,0.15); vseg(0.85,-1.65); hseg(-1.8); vseg(-1.25,-1.65); vseg(-1.25,0.15); hseg(0); }
    if (d == 9) { hseg(1.8); vseg(0.85,0.15); vseg(0.85,-1.65); hseg(-1.8); vseg(-1.25,0.15); hseg(0); }
}

module raised_cam_number() {
    translate([-1.55, -13.2, 0]) digit_segments(1);
    translate([ 1.55, -13.2, 0]) digit_segments(1);
}

module raised_stitch_preview() {
            translate([-4.1860, 11.4360, disc_thickness])
                rotate([0,0,0.0000])
                    cube(size=[0.8280, 0.7000, 0.8000], center=false);
            translate([-3.4500, 12.8400, disc_thickness])
                rotate([0,0,77.0829])
                    cube(size=[2.8809, 0.7000, 0.8000], center=false);
            translate([-2.8060, 12.8400, disc_thickness])
                rotate([0,0,-77.0829])
                    cube(size=[2.8809, 0.7000, 0.8000], center=false);
            translate([-2.0700, 11.4360, disc_thickness])
                rotate([0,0,0.0000])
                    cube(size=[0.8280, 0.7000, 0.8000], center=false);
            translate([-1.2880, 12.8400, disc_thickness])
                rotate([0,0,75.3127])
                    cube(size=[2.9029, 0.7000, 0.8000], center=false);
            translate([-0.5520, 12.8400, disc_thickness])
                rotate([0,0,-75.3127])
                    cube(size=[2.9029, 0.7000, 0.8000], center=false);
            translate([0.2300, 11.4360, disc_thickness])
                rotate([0,0,0.0000])
                    cube(size=[0.8280, 0.7000, 0.8000], center=false);
            translate([1.0120, 12.8400, disc_thickness])
                rotate([0,0,75.3127])
                    cube(size=[2.9029, 0.7000, 0.8000], center=false);
            translate([1.7480, 12.8400, disc_thickness])
                rotate([0,0,-75.3127])
                    cube(size=[2.9029, 0.7000, 0.8000], center=false);
            translate([2.5300, 11.4360, disc_thickness])
                rotate([0,0,0.0000])
                    cube(size=[0.8280, 0.7000, 0.8000], center=false);
            translate([3.3120, 12.8400, disc_thickness])
                rotate([0,0,75.3127])
                    cube(size=[2.9029, 0.7000, 0.8000], center=false);
            translate([4.1400, 12.8400, disc_thickness])
                rotate([0,0,-71.8594])
                    cube(size=[2.9549, 0.7000, 0.8000], center=false);
}

module elna_single_cam_11() {
    difference() {
        union() {
            // body
            cylinder(h = disc_thickness, r = body_radius);
            cylinder(h = disc_thickness, r = outer_reference_radius);

            // lower cam contour
            linear_extrude(height = lobe_thickness)
                lobe_profile();

            // visible raised labels
            raised_cam_number();
            raised_stitch_preview();
        }

        // Main shaft hole
        translate([0, 0, disc_thickness / 2])
            cylinder(h = disc_thickness + label_height + 1, r = inner_hole_rad, center = true);

        // Lower widened hole
        translate([0, 0, -cut_errors])
            cylinder(h = bigger_hole_ht + cut_errors, r = hole_bigger_rad);

        // Taper from widened hole to main hole
        translate([0, 0, bigger_hole_ht - cut_errors])
            cylinder(h = hole_cone_ht, r1 = hole_bigger_rad, r2 = inner_hole_rad);

        // Transport slot
        translate([0, hole_bigger_rad + gap_to_transporthole + transporthole_length / 2,
                   transporthole_depth / 2 - cut_errors])
            cube(size = [transporthole_width, transporthole_length, transporthole_depth + label_height + 1], center = true);
    }
}

elna_single_cam_11();
